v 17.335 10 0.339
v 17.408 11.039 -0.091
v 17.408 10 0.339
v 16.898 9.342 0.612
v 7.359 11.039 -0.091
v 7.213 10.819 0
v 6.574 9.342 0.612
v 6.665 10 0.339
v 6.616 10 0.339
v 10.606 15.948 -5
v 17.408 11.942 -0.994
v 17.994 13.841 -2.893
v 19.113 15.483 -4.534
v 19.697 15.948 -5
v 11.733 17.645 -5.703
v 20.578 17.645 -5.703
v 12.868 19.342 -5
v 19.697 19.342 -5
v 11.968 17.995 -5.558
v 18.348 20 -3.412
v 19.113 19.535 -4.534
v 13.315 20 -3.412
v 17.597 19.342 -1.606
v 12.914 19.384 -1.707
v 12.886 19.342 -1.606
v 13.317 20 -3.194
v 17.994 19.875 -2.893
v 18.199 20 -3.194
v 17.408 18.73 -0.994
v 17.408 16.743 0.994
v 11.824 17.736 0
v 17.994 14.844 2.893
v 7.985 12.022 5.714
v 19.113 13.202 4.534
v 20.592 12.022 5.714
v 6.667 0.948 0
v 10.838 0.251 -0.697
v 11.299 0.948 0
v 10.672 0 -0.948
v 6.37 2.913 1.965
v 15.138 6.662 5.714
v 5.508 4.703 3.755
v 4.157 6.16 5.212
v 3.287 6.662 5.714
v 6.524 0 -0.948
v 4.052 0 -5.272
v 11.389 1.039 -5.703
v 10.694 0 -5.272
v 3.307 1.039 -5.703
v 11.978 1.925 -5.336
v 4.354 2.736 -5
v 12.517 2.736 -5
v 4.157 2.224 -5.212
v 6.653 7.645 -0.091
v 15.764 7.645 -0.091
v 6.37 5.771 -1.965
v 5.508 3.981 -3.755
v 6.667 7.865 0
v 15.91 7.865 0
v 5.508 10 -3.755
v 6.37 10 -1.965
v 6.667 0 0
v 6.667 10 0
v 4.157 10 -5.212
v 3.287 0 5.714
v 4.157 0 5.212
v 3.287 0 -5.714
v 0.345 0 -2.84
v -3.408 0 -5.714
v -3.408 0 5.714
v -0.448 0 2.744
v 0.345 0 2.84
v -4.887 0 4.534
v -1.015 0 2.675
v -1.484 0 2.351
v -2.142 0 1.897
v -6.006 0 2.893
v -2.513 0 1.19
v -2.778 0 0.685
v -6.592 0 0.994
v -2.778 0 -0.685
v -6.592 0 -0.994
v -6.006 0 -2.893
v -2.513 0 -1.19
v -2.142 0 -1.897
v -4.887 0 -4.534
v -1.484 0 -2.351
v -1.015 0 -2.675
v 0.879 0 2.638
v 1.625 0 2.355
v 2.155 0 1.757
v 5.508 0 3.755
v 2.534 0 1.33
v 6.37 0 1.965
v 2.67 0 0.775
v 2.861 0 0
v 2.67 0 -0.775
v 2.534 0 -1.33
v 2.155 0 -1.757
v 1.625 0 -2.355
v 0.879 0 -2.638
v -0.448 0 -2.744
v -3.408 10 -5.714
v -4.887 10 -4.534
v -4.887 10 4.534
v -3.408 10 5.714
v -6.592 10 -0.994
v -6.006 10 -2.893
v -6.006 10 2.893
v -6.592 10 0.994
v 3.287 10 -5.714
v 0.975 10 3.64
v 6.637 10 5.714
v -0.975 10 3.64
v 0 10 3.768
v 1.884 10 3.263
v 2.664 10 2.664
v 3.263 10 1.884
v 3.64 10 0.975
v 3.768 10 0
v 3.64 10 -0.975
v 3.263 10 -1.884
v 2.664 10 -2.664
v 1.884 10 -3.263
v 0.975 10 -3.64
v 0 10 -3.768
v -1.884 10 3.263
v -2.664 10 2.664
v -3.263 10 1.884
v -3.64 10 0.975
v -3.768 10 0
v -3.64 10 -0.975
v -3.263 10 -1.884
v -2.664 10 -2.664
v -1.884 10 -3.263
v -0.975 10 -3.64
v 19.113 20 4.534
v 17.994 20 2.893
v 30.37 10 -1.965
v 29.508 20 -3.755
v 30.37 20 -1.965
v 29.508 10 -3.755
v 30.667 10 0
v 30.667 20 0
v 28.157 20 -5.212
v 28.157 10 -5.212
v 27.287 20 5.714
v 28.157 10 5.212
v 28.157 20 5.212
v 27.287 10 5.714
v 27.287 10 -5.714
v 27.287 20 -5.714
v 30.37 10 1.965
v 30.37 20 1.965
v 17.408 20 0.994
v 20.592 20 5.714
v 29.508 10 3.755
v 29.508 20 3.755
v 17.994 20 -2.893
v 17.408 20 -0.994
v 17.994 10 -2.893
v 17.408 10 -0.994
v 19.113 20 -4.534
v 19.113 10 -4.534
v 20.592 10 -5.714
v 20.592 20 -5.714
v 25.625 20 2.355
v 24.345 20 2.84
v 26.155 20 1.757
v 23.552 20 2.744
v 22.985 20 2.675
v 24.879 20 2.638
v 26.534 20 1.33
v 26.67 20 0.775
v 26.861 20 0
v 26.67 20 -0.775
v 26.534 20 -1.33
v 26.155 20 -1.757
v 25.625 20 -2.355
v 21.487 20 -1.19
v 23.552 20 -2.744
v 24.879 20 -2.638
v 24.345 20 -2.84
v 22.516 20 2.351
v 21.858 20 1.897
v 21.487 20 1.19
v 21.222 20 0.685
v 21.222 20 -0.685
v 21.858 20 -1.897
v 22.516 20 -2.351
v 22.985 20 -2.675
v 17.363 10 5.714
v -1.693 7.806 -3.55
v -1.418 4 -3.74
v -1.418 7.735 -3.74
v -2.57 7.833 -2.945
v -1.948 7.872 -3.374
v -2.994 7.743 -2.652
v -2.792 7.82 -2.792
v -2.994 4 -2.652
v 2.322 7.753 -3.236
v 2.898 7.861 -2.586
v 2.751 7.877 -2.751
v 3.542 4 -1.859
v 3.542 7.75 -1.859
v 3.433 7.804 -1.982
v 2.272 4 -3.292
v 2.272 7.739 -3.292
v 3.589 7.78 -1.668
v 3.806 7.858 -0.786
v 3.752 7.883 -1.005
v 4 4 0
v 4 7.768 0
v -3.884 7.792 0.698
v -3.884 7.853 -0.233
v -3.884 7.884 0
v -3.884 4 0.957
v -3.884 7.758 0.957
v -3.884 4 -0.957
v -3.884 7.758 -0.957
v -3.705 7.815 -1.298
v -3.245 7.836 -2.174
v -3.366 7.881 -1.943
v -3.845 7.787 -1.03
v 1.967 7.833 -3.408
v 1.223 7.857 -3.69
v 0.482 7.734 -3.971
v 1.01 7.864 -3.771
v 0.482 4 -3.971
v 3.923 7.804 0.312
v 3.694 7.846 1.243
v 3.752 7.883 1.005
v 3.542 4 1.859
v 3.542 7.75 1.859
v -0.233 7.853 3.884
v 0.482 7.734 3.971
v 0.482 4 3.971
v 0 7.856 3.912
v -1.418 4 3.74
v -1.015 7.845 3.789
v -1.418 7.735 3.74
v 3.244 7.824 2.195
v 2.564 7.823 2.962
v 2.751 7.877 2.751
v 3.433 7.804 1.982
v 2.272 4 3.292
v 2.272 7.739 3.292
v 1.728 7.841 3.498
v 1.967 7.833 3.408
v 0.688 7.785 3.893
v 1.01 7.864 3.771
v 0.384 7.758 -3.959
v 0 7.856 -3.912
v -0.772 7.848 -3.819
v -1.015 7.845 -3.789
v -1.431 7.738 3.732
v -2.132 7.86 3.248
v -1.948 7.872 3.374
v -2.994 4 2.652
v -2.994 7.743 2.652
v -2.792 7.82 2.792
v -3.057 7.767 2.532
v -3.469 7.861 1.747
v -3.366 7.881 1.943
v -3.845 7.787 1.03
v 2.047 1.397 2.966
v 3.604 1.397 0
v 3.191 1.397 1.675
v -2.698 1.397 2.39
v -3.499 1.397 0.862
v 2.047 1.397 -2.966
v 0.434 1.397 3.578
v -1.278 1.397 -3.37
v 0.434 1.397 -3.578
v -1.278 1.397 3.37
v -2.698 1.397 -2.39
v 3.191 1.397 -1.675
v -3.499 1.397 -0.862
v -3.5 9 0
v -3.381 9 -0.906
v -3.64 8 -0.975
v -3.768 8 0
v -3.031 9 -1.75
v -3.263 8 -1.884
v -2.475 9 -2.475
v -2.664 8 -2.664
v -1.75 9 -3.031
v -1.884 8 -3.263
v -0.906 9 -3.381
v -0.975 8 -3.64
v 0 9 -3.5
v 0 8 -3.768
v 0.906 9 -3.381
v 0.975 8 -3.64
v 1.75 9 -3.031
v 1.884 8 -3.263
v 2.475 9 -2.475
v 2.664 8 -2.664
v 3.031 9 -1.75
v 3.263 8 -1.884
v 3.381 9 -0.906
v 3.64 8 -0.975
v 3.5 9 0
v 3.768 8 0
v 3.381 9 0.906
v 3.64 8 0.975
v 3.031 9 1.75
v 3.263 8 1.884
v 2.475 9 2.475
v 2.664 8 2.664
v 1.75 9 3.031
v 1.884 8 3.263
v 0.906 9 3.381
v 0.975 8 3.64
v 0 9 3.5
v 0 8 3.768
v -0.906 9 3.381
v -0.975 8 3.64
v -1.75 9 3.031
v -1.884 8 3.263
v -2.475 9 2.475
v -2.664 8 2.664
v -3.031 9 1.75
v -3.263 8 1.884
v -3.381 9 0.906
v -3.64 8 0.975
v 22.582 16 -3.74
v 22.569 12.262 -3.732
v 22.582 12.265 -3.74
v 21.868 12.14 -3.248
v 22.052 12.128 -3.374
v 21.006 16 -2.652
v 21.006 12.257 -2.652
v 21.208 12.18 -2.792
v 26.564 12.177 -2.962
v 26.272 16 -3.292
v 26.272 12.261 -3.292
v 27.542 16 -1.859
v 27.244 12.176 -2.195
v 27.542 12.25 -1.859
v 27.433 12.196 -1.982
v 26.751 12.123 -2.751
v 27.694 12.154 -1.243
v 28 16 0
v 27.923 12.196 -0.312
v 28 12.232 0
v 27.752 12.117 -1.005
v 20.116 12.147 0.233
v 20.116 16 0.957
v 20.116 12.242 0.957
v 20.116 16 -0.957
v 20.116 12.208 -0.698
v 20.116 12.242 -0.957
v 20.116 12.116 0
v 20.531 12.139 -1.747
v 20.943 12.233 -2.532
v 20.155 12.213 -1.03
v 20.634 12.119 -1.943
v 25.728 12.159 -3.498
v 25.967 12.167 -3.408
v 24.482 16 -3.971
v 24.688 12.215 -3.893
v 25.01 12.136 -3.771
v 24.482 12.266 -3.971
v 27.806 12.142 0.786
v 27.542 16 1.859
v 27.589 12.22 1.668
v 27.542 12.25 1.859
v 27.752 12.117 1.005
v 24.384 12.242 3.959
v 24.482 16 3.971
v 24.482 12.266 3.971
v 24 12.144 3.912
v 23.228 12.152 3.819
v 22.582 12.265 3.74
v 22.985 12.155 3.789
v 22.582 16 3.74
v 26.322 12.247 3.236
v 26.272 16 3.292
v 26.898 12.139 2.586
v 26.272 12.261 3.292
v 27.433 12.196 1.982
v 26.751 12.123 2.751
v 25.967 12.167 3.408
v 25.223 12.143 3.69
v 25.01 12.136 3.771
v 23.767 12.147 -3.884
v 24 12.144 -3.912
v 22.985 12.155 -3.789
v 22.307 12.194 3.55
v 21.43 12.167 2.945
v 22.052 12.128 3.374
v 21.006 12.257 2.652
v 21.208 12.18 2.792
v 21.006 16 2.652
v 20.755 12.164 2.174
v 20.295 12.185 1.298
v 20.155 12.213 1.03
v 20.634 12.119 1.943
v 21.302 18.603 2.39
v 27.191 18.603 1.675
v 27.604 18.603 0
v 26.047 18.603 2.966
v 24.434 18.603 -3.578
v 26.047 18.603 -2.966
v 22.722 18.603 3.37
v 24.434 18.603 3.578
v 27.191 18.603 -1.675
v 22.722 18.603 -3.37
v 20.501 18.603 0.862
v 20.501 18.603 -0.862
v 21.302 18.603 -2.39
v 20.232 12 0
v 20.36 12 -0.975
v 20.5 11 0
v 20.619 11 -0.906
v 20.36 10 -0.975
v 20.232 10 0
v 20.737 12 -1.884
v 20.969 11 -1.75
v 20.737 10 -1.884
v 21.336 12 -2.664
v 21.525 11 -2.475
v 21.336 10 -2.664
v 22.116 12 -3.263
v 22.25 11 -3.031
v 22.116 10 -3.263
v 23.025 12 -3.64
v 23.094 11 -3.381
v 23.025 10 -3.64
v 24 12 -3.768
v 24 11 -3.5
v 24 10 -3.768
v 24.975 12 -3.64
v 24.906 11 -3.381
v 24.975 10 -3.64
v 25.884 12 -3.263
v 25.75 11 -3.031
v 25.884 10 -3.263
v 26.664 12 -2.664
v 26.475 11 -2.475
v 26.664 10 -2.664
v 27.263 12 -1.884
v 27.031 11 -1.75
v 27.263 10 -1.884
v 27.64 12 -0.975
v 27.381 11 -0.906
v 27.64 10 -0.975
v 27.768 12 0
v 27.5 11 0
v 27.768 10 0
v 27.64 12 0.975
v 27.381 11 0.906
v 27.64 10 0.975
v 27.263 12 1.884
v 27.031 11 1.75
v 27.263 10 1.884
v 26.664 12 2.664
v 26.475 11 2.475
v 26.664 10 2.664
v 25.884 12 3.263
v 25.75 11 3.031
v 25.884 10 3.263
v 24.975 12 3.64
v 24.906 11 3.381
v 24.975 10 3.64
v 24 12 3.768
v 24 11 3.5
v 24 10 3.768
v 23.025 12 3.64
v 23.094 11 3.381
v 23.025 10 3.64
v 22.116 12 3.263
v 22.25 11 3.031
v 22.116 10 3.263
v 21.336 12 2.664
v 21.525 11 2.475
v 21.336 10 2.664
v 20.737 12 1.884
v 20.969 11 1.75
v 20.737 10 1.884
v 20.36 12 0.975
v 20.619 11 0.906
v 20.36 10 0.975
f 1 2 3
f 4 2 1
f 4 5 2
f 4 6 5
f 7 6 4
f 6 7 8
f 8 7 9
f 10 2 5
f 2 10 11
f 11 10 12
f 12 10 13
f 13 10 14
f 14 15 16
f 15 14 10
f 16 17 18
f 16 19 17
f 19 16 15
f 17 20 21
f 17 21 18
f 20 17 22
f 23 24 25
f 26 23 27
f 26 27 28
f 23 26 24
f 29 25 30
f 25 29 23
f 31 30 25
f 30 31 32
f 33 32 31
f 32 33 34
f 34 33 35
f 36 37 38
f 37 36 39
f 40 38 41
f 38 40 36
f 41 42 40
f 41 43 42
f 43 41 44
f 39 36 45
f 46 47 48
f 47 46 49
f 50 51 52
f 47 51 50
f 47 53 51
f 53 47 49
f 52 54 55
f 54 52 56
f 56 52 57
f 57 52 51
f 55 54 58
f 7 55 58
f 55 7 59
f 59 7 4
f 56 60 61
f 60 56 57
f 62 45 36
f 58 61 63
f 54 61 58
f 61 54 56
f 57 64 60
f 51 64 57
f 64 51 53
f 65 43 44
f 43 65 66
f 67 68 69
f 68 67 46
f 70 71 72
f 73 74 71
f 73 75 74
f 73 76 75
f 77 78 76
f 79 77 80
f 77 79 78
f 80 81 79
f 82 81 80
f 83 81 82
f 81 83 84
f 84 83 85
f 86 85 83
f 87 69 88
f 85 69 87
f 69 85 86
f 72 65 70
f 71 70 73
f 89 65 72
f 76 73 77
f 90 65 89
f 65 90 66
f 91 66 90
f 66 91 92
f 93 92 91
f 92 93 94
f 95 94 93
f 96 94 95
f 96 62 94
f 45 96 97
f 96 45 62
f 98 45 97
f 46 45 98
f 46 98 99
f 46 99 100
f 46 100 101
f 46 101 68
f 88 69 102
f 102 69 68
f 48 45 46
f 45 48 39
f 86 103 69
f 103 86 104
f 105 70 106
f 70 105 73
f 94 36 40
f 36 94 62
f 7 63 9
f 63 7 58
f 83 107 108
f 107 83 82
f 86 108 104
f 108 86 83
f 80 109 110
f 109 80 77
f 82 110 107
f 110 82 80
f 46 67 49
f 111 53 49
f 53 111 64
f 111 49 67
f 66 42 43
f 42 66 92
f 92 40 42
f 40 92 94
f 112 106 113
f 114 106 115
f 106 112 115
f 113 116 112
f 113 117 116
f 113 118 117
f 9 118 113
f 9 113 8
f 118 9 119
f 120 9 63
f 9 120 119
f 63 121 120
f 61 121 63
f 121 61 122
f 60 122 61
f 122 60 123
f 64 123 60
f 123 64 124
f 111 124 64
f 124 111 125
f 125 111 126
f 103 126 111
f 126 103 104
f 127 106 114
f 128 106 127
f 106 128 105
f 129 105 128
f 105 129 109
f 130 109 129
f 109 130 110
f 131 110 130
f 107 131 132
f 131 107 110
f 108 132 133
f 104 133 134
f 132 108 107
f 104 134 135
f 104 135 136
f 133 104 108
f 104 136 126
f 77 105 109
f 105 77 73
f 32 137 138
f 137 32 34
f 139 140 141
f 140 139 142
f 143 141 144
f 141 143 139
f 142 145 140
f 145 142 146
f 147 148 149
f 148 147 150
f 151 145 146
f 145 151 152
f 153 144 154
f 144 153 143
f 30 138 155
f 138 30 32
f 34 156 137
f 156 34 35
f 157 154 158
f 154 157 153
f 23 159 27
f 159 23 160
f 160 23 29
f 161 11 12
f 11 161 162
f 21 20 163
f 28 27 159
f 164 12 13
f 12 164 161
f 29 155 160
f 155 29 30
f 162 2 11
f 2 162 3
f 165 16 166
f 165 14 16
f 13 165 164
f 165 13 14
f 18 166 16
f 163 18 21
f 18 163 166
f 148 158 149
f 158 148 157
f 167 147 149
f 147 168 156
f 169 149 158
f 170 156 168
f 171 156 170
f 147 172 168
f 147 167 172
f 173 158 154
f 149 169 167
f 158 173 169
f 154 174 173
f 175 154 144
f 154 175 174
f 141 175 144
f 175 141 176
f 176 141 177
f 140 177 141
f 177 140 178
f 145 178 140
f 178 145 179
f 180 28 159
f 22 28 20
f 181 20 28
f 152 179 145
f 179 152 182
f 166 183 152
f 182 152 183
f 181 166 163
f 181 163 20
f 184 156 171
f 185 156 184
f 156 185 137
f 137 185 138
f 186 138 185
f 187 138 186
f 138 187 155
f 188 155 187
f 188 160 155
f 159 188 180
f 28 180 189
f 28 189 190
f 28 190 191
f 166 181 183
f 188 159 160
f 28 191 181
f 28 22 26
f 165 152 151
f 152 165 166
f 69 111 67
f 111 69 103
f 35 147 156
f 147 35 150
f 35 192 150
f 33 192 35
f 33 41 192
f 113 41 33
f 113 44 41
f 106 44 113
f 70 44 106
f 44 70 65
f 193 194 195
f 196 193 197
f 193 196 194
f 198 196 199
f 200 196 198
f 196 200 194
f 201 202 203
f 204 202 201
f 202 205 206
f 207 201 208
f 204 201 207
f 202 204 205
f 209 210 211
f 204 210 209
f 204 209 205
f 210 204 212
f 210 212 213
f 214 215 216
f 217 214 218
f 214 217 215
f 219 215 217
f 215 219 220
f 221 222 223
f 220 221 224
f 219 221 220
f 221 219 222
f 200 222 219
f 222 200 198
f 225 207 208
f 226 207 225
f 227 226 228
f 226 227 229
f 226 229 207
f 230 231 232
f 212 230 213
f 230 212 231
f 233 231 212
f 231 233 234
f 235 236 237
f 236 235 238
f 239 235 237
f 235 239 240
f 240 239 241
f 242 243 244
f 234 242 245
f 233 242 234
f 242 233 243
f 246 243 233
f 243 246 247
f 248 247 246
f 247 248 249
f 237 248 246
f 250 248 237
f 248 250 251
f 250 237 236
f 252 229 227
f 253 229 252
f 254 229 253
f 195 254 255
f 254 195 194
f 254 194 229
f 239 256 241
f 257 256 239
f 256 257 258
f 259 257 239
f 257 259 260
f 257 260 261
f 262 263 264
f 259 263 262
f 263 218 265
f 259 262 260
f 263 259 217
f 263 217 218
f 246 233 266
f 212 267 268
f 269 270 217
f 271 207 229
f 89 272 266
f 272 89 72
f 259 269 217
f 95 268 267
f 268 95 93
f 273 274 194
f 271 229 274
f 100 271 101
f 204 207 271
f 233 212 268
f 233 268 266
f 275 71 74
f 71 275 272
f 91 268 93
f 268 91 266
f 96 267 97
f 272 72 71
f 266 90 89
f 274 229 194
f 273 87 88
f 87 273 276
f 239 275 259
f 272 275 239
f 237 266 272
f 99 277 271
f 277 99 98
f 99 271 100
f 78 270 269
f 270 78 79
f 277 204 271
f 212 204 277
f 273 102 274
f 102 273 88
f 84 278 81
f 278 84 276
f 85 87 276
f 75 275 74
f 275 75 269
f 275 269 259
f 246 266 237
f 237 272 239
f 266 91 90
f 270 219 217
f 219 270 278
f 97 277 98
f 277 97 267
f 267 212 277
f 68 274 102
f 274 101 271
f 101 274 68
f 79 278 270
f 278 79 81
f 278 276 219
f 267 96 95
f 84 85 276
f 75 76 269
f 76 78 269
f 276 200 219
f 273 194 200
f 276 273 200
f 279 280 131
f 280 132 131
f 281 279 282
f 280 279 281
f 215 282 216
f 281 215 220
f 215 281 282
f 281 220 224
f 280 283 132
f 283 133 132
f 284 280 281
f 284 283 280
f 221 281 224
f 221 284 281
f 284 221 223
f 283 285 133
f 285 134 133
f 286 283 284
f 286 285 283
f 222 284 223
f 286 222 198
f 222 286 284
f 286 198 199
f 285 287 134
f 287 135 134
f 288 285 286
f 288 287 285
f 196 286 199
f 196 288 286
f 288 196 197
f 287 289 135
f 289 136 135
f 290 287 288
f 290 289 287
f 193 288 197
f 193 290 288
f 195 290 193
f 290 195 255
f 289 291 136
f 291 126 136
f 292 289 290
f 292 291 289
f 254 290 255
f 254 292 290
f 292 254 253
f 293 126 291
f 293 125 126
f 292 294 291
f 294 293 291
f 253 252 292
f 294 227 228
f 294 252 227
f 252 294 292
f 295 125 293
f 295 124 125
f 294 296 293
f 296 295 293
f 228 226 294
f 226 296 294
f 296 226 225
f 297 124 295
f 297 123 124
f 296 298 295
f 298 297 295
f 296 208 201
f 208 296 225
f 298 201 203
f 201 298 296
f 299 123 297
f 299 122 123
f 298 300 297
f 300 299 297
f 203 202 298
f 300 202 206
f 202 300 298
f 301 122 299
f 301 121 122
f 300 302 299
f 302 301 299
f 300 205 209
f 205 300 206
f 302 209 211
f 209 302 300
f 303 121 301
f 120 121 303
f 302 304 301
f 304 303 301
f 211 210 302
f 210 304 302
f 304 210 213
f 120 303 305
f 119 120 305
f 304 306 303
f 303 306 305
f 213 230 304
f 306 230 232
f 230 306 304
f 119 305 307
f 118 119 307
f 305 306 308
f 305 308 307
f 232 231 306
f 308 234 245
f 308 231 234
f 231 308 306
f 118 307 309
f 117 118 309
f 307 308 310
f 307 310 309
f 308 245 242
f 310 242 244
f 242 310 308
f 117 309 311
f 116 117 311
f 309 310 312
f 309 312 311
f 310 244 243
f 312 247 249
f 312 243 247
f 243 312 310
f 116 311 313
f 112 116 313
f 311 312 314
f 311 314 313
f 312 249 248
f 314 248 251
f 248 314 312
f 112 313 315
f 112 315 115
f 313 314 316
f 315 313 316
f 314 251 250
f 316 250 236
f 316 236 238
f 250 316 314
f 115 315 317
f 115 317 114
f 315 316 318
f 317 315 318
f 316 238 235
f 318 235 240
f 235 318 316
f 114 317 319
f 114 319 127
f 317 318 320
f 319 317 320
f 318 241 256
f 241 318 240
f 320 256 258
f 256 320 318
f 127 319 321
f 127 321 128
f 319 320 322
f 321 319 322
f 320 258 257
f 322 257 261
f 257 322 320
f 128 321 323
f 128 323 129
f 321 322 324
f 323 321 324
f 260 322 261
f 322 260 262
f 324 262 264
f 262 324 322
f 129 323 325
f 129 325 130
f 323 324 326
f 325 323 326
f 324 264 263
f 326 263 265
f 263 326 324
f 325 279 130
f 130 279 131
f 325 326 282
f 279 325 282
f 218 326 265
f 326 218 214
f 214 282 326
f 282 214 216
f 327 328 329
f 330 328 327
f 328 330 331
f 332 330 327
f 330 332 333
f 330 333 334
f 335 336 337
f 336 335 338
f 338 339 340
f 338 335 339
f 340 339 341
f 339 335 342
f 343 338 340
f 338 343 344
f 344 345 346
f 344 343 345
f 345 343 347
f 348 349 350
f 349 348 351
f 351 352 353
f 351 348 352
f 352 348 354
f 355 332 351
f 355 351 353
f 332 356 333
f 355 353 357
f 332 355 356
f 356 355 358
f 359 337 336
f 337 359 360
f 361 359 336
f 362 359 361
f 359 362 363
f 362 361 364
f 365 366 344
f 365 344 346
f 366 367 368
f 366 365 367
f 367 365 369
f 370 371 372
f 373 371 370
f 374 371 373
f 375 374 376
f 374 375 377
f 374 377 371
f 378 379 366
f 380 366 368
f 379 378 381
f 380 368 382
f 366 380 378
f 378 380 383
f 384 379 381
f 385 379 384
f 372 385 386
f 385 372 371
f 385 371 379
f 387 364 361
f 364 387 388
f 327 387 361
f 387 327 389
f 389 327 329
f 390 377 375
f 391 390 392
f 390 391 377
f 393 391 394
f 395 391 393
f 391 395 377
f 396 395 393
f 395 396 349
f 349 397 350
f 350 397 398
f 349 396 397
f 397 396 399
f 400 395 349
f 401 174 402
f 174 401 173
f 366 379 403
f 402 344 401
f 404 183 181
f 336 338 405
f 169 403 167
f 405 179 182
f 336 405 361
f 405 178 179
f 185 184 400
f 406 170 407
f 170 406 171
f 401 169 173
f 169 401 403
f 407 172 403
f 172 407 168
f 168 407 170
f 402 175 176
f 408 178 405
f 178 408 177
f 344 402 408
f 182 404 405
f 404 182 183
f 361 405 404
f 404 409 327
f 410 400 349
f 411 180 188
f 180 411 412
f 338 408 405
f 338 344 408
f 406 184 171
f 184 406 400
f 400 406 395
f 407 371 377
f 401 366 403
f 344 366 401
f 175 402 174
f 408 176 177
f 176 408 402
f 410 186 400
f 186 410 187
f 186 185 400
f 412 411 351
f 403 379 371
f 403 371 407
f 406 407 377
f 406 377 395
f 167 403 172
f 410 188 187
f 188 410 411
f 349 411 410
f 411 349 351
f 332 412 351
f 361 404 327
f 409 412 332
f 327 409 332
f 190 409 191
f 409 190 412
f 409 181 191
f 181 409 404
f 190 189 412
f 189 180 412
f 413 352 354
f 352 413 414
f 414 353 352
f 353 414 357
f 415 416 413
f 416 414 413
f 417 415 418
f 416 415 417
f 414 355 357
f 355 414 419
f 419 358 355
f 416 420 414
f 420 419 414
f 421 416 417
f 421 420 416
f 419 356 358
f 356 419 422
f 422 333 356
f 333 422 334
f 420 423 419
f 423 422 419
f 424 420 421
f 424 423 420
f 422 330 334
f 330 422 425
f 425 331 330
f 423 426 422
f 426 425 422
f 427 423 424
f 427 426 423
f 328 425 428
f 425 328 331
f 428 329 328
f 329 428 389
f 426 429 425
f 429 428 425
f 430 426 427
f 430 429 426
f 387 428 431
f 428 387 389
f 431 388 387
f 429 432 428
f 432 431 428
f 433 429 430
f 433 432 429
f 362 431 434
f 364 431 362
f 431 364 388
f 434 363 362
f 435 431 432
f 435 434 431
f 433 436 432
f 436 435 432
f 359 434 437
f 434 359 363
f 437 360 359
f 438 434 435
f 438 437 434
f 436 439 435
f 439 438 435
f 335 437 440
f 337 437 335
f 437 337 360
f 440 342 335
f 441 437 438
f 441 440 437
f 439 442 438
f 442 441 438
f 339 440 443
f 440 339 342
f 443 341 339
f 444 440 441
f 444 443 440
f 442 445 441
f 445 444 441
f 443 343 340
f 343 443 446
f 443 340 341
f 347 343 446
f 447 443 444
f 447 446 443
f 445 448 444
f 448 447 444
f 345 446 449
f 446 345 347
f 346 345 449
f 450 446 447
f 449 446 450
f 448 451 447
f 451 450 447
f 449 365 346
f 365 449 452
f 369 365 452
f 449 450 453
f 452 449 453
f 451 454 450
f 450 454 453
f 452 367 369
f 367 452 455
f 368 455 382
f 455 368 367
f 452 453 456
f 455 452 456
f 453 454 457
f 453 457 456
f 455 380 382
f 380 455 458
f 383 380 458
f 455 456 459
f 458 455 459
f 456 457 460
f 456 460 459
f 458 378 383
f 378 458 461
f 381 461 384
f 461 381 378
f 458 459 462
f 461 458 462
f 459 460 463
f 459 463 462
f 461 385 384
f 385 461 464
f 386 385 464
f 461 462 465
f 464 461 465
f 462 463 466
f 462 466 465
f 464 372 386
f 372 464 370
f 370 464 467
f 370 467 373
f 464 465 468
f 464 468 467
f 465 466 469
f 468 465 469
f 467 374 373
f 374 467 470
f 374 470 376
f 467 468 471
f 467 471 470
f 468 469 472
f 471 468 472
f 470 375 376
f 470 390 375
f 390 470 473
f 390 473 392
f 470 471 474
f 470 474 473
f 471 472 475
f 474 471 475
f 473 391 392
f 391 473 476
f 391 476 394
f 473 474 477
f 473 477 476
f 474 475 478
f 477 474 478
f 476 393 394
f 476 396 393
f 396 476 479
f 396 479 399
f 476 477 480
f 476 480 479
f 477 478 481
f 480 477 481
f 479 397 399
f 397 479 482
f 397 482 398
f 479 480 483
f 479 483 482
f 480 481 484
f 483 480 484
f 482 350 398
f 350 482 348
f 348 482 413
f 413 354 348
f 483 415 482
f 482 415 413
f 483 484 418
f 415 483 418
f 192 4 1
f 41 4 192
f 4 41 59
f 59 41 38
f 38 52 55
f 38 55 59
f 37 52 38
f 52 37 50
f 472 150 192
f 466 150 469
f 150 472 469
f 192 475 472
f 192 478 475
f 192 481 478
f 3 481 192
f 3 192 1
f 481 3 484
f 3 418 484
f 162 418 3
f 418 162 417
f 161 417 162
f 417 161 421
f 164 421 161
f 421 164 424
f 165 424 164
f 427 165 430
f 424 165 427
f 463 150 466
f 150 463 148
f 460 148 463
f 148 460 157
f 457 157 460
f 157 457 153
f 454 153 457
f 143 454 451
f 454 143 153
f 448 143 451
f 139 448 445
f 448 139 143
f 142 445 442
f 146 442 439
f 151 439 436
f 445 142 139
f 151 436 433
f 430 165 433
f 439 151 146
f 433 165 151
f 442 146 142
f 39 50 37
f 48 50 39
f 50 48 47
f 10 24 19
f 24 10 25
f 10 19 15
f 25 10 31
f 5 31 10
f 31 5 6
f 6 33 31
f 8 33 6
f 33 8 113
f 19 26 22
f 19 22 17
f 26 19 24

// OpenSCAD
// file: pill.scad
//
//  Copyright (C) 03-06-2013 Jasper den Ouden.
//
//  This is free software: you can redistribute it and/or modify
//  it under the terms of the GNU General Public License as published
//  by the Free Software Foundation, either version 3 of the License, or
//  (at your option) any later version.
//

//The size difference between the male and female.
t=0;
//Length.
l = 20;
//Length of the top bit.
lt = 5;
//Radius.
R = 5;
//Dip.
d = 0.5;
//Number of petals.
n = 2;

module pill_sub()
{
    translate([0,0,lt]) difference()
    {   union()
        {   cylinder(r=R-t, h=l-2*lt);
            scale([1,1,1.5*lt/R]) sphere(R-t);
            translate([0,0,l-2*lt]) scale([1,1,1.5*lt/R]) sphere(R-t);
        }
        rotate_extrude() translate([R+d,l/2-lt]) circle(2*d+t, $fn=12);
        translate([0,0,-l-lt]) cube(l*[2,2,2], center=true);
        translate([0,0,2*l-lt]) cube(l*[2,2,2], center=true);
    }
}

module pill_flower()
{   difference()
    {   circle(R);
        for( a=[0:360/n:360] ) rotate(a)union()
        {   
            translate([R,0]) rotate(22) 
            {   square(R*[2.5,1/2], center=true);
                translate([-1.25*R,0]) circle(R/4, $fn=12);
            }
        }
    }
}

module pill()
{
    intersection()
    {   pill_sub(R=R,l=l,t=t,lt=lt,d=d);
        linear_extrude(height=l) pill_flower(n=n,R=R);
    }
}

pill(); 
//pill_flower();
translate([3*R,0]) pill_sub(t=0.5);
// main file
//
//  Copyright (C) 03-06-2013 Jasper den Ouden.
//
//  This is free software: you can redistribute it and/or modify
//  it under the terms of the GNU General Public License as published
//  by the Free Software Foundation, either version 3 of the License, or
//  (at your option) any later version.
//

use<pill.scad>

//$fs=0.5;

r=2.4;
w=20;

module v_profile()
{
    t=2*r;
    s=w/sqrt(2)-r;
    union()
    {
        circle(r);
        translate([0,s]) circle(r);
        translate([s,0]) circle(r);
        translate([-r,0]) square([t,s]);
        translate([0,-r]) square([s,t]);
        difference()
        {   square([t,t]);
            translate([t,t]) circle(r);
        }
    }
}

l=40;
t=1;
module pill_v_beam()
{   s=w/sqrt(2)-r;
    rotate([-90,0,0]) difference()
    {   intersection()
        {   union()
            {   translate([0,-w/4,s-r]) rotate([0,90,0]) linear_extrude(height=l) 
                    rotate(45) v_profile();
                cylinder(r=w/3, h=w/2); //Pills go in here.
                translate([l,0]) cylinder(r=w/3, h=w);
            }
            translate([l/2,0,w/2]) cube([2*l,4*w/7,w], center=true);
        }
        translate([0,0,-t]) pill_sub(t=t);
        translate([0,0,w/2]) scale([1,20,1]) cylinder(r1=w/3,r2=2*w/3,h=w/2);
        translate([l,0]) 
        {   translate([0,0,t]) pill_sub(t=t);
            scale([1,20,1]) cylinder(r2=w/3,r1=2*w/3,h=w/2);
        }
    }
}

//pill_sub(t=t);

//linear_extrude(height=20) v_profile();

pill_v_beam(l=24);
